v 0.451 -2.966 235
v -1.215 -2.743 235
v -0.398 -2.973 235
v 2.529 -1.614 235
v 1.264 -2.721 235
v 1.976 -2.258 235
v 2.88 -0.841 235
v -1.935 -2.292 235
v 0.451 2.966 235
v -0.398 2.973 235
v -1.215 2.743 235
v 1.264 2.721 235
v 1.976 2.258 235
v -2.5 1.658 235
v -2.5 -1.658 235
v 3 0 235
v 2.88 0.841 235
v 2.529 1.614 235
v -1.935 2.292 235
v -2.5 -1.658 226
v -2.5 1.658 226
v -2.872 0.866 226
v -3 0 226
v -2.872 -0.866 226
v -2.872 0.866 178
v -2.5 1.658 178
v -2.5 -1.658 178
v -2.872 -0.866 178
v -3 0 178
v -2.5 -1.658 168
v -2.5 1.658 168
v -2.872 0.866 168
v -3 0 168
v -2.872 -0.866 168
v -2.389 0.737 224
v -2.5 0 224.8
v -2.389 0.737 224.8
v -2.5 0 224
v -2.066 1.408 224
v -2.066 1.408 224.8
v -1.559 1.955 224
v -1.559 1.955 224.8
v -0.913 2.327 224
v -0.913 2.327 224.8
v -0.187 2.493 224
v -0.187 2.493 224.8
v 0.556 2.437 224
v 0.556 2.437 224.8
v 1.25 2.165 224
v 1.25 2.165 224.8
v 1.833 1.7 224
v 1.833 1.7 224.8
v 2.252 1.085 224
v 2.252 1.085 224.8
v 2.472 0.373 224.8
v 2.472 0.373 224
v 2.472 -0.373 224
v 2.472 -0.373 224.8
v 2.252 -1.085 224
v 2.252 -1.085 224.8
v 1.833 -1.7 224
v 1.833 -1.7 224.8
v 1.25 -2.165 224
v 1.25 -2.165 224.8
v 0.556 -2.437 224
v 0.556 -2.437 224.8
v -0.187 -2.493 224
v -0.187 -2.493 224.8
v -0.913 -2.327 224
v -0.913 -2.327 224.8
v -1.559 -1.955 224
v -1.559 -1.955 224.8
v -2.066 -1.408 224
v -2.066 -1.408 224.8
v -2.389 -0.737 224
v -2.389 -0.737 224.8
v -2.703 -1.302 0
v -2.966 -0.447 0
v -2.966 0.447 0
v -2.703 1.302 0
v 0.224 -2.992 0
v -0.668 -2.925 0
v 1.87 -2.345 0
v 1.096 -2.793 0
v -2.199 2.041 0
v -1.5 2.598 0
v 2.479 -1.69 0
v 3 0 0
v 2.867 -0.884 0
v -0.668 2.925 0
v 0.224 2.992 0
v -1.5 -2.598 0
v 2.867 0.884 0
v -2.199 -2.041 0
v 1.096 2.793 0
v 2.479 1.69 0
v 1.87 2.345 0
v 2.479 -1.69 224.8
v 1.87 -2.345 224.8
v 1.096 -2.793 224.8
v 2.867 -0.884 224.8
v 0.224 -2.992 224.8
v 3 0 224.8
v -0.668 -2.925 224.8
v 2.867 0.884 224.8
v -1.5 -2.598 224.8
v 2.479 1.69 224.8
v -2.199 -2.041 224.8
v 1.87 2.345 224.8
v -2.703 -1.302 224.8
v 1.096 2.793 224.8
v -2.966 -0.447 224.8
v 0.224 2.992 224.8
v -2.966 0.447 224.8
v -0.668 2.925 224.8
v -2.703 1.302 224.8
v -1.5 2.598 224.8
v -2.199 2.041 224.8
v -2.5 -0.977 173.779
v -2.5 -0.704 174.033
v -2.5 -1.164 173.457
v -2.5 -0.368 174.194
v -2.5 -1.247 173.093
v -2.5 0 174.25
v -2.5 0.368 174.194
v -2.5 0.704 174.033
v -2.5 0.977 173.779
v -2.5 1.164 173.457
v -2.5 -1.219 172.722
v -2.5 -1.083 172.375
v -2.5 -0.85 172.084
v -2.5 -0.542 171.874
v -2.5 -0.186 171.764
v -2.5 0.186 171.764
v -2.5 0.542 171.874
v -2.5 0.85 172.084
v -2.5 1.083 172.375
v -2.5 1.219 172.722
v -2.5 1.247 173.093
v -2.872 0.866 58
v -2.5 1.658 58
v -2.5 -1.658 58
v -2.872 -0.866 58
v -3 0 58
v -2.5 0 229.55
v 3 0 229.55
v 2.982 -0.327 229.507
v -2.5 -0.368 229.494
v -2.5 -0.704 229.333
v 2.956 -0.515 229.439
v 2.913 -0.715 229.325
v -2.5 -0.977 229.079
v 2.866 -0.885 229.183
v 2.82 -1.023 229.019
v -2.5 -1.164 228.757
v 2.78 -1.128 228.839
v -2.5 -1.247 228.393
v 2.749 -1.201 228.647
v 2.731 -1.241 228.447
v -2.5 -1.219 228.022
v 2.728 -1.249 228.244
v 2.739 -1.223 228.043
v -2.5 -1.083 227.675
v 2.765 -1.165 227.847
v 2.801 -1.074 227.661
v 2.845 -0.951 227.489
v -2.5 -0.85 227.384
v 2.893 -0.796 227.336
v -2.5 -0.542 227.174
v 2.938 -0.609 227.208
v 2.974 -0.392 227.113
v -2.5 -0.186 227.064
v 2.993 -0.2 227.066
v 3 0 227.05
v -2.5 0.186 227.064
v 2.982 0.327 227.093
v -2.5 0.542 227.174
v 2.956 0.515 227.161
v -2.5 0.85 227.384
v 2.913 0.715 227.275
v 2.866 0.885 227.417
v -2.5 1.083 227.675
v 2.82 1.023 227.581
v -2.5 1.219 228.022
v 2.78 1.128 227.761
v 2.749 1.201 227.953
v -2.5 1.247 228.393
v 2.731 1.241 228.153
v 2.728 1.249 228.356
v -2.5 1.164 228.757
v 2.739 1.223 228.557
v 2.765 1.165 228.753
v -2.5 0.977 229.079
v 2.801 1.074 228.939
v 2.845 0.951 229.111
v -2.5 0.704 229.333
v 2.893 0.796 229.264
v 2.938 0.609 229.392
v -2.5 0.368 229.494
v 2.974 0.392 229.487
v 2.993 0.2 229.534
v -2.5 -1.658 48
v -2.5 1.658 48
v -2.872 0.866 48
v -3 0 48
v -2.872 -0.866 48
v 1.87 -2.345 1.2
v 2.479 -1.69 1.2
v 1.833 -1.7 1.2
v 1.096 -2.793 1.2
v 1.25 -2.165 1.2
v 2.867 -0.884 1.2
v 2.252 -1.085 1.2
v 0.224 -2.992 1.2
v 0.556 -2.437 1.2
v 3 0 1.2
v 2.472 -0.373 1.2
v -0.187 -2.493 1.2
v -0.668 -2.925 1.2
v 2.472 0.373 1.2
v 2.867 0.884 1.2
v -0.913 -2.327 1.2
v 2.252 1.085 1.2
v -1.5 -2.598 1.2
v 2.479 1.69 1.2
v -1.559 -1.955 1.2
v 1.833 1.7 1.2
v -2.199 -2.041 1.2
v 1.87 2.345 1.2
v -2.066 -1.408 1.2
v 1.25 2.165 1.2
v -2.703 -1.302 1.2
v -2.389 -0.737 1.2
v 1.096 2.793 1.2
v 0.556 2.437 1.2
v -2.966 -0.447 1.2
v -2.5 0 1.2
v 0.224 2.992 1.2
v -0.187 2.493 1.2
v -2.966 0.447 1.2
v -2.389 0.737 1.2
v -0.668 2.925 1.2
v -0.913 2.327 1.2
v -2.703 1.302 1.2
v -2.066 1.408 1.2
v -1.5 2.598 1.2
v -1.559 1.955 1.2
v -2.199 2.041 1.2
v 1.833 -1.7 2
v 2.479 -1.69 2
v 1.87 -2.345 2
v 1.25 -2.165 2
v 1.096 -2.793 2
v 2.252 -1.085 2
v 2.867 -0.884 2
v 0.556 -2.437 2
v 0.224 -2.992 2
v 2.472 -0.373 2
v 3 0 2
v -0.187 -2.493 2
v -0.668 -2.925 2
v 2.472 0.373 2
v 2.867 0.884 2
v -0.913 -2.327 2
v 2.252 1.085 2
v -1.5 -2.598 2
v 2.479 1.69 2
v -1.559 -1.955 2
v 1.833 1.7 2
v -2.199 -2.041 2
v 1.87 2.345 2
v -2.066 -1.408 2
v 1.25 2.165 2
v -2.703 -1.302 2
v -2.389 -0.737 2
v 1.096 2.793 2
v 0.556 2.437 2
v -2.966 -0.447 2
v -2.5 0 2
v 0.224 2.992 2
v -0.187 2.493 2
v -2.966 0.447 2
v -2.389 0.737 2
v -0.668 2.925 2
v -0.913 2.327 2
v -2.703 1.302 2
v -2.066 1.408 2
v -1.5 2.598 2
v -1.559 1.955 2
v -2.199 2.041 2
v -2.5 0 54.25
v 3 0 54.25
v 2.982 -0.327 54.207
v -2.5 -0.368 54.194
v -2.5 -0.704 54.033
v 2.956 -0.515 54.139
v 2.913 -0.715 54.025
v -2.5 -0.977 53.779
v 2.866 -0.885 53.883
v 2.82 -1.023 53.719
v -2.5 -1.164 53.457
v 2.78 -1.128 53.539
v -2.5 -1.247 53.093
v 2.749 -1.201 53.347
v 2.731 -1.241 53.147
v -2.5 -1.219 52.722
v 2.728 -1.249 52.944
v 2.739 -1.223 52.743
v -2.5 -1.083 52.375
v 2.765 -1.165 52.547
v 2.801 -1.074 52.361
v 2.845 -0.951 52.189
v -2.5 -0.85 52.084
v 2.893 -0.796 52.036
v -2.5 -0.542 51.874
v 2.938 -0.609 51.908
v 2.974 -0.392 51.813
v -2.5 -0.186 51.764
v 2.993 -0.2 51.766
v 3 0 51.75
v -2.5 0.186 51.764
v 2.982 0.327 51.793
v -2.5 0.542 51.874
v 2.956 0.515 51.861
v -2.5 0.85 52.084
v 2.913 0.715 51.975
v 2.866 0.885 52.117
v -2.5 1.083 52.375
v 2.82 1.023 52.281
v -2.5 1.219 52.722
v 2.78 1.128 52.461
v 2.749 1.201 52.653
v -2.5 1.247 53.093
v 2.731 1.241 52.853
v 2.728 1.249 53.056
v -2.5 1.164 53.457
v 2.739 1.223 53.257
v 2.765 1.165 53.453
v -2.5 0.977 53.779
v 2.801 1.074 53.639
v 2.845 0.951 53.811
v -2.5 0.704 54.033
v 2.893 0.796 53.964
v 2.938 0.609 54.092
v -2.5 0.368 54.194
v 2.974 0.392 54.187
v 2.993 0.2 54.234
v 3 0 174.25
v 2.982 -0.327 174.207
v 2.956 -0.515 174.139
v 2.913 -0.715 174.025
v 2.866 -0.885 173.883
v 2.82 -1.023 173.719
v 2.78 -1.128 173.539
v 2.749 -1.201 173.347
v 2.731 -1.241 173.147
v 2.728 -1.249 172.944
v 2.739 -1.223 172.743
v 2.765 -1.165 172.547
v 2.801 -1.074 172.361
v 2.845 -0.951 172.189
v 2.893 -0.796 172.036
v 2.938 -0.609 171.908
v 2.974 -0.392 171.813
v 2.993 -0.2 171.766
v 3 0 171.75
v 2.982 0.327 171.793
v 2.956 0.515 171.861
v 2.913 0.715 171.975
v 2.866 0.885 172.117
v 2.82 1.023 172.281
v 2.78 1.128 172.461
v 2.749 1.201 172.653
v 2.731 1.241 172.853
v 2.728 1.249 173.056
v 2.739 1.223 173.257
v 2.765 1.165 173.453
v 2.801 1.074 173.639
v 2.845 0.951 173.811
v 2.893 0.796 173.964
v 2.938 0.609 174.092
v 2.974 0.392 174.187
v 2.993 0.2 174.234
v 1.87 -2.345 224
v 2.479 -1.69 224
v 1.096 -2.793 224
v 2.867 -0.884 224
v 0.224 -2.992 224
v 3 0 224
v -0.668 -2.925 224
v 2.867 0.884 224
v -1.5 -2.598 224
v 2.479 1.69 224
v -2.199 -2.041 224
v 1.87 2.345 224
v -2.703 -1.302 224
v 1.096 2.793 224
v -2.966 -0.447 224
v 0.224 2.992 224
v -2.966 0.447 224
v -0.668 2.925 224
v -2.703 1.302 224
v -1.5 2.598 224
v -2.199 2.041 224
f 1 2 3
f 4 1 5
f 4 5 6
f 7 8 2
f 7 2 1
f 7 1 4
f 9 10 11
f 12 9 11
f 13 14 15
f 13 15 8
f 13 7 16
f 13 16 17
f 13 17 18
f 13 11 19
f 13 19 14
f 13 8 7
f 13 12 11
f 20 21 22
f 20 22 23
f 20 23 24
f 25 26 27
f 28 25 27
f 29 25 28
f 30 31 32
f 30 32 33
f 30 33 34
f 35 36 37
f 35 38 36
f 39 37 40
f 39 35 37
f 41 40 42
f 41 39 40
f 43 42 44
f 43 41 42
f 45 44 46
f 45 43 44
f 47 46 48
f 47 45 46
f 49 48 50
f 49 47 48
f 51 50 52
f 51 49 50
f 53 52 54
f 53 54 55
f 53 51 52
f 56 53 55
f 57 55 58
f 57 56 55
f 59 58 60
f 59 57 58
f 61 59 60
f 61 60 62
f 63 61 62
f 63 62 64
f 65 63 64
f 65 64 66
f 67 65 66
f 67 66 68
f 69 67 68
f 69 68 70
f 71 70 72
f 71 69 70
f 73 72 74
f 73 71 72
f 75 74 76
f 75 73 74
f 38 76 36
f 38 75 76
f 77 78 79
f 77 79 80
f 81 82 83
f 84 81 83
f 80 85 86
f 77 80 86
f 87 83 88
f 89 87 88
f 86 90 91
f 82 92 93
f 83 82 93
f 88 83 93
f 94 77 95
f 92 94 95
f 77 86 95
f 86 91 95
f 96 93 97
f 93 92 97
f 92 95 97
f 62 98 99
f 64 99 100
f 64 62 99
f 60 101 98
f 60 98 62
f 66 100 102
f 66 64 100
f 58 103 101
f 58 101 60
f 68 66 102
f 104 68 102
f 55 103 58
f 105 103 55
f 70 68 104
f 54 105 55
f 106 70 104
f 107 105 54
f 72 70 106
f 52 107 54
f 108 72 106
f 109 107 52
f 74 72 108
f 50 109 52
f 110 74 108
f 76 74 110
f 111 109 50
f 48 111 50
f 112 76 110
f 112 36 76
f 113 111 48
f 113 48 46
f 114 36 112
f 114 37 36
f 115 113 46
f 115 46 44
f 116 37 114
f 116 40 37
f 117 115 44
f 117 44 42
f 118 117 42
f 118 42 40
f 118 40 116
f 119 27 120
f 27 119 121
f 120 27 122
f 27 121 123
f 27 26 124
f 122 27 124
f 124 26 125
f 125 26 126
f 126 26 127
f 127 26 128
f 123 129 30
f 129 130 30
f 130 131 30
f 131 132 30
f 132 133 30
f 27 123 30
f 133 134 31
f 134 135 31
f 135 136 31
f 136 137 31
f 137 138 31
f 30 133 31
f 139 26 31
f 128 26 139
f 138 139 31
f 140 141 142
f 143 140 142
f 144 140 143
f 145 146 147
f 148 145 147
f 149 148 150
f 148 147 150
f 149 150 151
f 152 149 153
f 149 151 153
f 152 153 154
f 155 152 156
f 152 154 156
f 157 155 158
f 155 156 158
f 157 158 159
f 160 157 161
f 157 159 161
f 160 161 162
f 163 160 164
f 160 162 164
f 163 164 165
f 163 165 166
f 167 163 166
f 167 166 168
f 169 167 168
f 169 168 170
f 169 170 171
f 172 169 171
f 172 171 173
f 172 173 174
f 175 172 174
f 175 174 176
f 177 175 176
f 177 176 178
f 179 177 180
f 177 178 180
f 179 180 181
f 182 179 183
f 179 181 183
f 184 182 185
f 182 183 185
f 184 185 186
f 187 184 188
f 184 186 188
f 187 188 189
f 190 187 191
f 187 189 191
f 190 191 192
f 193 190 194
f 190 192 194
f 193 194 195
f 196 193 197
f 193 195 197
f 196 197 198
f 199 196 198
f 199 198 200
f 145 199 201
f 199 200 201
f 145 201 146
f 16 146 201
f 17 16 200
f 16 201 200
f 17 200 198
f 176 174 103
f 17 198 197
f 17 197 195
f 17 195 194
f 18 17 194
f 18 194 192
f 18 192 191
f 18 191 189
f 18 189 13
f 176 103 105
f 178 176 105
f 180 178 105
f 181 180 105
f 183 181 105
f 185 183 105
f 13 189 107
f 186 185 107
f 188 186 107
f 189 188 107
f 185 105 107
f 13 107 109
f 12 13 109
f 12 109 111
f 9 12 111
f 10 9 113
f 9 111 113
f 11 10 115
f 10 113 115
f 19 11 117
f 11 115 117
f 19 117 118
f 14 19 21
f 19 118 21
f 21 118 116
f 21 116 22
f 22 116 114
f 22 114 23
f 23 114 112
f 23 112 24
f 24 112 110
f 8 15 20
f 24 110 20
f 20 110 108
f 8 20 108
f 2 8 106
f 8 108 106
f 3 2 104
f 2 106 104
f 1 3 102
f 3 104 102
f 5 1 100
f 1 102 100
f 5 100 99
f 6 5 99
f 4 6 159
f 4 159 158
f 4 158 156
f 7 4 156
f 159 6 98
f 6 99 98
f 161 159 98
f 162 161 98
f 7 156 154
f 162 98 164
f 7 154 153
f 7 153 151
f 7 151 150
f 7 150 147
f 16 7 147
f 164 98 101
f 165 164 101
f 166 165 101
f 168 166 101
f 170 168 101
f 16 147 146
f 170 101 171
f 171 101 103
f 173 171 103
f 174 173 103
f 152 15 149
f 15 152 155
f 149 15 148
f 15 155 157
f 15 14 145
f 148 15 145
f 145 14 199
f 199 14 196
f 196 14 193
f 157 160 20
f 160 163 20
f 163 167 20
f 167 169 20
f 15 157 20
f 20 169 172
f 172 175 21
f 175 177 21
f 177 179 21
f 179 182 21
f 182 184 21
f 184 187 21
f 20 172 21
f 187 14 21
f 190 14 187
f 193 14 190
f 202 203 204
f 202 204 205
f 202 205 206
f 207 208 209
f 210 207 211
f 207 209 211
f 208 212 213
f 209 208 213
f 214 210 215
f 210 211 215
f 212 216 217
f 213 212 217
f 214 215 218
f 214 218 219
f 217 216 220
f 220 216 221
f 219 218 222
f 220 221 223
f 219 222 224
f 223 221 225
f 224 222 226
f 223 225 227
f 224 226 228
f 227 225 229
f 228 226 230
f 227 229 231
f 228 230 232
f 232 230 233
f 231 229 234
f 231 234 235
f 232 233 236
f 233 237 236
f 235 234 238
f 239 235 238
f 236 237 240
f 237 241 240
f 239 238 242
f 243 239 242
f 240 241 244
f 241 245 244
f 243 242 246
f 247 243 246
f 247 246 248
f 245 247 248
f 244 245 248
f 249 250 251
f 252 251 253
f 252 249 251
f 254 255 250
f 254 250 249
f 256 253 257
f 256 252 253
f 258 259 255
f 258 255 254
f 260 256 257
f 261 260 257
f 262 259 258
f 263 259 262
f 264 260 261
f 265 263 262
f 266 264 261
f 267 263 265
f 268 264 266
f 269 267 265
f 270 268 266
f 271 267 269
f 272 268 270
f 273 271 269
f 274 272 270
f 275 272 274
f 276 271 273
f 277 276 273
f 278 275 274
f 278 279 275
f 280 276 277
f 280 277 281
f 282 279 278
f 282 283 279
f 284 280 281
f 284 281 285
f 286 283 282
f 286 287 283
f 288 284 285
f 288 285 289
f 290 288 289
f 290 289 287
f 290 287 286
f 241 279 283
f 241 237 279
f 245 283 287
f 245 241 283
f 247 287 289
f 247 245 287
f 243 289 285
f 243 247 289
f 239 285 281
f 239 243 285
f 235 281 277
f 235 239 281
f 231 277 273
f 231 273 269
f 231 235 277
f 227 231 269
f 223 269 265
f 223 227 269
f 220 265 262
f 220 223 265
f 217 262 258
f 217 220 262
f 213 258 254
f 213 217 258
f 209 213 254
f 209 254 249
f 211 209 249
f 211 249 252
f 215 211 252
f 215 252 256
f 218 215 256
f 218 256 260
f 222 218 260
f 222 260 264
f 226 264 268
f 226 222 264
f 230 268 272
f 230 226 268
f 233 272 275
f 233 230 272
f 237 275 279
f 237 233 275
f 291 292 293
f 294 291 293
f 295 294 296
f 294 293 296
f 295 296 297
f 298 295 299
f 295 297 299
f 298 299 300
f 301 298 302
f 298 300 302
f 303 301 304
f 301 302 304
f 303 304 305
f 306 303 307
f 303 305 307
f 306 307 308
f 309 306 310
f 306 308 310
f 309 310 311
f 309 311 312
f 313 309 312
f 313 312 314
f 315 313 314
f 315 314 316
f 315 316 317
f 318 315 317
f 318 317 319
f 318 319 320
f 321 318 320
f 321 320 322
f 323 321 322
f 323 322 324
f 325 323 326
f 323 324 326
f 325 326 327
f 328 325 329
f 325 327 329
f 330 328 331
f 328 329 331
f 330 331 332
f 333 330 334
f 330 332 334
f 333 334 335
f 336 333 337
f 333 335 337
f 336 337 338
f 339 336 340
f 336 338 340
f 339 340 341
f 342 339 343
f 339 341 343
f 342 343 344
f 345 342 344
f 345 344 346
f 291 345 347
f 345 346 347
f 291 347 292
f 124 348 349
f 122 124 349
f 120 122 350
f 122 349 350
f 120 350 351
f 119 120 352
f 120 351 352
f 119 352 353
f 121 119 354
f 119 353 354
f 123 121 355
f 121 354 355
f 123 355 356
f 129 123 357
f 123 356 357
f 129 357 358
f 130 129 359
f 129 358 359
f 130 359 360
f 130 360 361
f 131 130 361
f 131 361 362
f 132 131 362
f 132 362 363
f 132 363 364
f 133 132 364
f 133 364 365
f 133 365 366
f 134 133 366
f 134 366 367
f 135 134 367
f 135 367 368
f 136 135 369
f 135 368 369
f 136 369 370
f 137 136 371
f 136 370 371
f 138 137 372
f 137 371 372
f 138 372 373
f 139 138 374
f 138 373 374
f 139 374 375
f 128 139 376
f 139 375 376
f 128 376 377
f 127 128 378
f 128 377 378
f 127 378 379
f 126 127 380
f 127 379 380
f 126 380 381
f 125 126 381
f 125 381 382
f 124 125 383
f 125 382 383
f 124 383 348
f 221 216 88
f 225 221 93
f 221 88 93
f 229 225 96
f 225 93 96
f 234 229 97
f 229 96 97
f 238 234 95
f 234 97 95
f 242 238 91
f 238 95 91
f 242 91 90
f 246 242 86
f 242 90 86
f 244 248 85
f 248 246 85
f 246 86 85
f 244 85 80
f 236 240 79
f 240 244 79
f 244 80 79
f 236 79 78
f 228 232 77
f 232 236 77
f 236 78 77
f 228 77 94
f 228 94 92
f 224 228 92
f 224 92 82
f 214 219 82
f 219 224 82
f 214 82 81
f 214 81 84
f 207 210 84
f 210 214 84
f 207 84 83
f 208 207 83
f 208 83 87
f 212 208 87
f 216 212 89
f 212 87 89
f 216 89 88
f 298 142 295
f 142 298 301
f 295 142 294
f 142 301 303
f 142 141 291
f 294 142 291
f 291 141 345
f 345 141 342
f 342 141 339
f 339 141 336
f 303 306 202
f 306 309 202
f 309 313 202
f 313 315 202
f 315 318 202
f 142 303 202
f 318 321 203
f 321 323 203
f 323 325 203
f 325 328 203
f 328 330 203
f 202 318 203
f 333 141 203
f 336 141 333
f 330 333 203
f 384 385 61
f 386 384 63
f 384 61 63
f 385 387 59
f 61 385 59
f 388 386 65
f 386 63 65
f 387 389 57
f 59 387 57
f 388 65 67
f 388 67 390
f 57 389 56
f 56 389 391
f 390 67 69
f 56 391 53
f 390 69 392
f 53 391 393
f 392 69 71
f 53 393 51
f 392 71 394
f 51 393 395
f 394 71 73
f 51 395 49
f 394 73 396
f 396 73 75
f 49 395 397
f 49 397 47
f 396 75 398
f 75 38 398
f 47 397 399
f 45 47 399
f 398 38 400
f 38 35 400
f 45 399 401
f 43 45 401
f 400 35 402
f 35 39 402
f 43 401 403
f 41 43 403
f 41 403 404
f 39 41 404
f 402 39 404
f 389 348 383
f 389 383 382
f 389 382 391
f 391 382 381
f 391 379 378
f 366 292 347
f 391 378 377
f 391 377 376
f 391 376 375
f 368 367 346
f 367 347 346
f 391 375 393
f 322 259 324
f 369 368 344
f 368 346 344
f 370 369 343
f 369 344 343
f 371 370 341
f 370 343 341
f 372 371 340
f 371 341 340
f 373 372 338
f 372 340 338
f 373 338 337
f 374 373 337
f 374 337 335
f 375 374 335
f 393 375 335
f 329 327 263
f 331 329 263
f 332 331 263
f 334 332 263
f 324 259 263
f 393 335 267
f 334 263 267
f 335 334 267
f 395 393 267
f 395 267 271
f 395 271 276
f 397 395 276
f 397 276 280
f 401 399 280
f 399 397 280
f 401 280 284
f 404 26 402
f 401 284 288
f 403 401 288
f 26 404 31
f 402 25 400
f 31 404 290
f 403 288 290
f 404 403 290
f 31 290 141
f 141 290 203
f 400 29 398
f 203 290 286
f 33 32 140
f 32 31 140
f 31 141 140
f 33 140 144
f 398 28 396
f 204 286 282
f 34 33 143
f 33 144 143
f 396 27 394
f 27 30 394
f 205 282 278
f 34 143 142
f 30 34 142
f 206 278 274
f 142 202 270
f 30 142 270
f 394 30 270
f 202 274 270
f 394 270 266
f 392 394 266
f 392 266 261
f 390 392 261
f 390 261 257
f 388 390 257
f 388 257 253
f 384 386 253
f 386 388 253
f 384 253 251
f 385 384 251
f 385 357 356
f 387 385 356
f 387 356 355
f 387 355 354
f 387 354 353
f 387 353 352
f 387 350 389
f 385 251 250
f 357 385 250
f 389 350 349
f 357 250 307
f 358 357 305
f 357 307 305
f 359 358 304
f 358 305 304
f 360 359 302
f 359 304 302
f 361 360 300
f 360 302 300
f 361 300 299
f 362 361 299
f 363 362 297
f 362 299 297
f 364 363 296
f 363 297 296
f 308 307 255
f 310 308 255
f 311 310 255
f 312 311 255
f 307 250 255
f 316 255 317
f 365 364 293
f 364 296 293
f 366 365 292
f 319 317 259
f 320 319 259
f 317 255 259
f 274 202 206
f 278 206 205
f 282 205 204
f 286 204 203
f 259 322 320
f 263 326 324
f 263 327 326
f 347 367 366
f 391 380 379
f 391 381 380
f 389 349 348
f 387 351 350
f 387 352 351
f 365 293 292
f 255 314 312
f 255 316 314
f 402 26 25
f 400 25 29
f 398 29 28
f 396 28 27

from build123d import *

# Parameters (mm, degrees)
SKETCH1_R               = 3
BOSS_EXTRUDE1_DEPTH     = 235
SKETCH2_W               = 0.5
SKETCH2_H               = 0.8
CUT_EXTRUDE1_DEPTH      = 10
CUT_EXTRUDE1_DEPTH_BACK = 10
SKETCH3_W               = 0.5
SKETCH3_H               = 10
SKETCH3_H_2             = 9
M3_TAPPED_HOLE1_D       = 2.5
M3X0_5_TAPPED_HOLE1_D   = 2.5


with BuildPart() as part:
    # Sketch1 → Boss-Extrude1 (new body)
    with BuildSketch(Plane.XY):
        Circle(SKETCH1_R)
    extrude(amount=BOSS_EXTRUDE1_DEPTH)

    # Sketch2 → Cut-Revolve1 (revolve, cut)
    with BuildSketch(Plane(origin=(0, 0, 0), x_dir=(1, 0, 0), z_dir=(0, 1, 0))):
        with Locations((-2.75, -1.6)):
            Rectangle(SKETCH2_W, SKETCH2_H)
        with Locations((-2.75, -224.4)):
            Rectangle(SKETCH2_W, SKETCH2_H)
    revolve(axis=Axis((0, 0, 240), (0, 0, -1)), mode=Mode.SUBTRACT)

    # Sketch3 → Cut-Extrude1 (cut, two sides: drawn at the far end of the back side and taken through both)
    with BuildSketch(Plane(origin=(0, 0, 0), x_dir=(1, 0, 0), z_dir=(0, 1, 0)).offset(-CUT_EXTRUDE1_DEPTH_BACK)):
        with Locations((-2.75, -53)):
            Rectangle(SKETCH3_W, SKETCH3_H)
        with Locations((-2.75, -173)):
            Rectangle(SKETCH3_W, SKETCH3_H)
        with Locations((-2.75, -230.5)):
            Rectangle(SKETCH3_W, SKETCH3_H_2)
    extrude(amount=CUT_EXTRUDE1_DEPTH + CUT_EXTRUDE1_DEPTH_BACK, mode=Mode.SUBTRACT)

    # M3 Tapped Hole1 (through all)
    with Locations(Plane(origin=(-2.5, 0, 173), x_dir=(0, 0, -1), z_dir=(-1, 0, 0))):
        with Locations((0, 0), (120, 0)):
            Hole(M3_TAPPED_HOLE1_D / 2)

    # M3x0.5 Tapped Hole1 (through all)
    with Locations(Plane(origin=(-2.5, 0, 228.3), x_dir=(0, 0, -1), z_dir=(-1, 0, 0))):
        with Locations((0, 0)):
            Hole(M3X0_5_TAPPED_HOLE1_D / 2)


solid = part.part
